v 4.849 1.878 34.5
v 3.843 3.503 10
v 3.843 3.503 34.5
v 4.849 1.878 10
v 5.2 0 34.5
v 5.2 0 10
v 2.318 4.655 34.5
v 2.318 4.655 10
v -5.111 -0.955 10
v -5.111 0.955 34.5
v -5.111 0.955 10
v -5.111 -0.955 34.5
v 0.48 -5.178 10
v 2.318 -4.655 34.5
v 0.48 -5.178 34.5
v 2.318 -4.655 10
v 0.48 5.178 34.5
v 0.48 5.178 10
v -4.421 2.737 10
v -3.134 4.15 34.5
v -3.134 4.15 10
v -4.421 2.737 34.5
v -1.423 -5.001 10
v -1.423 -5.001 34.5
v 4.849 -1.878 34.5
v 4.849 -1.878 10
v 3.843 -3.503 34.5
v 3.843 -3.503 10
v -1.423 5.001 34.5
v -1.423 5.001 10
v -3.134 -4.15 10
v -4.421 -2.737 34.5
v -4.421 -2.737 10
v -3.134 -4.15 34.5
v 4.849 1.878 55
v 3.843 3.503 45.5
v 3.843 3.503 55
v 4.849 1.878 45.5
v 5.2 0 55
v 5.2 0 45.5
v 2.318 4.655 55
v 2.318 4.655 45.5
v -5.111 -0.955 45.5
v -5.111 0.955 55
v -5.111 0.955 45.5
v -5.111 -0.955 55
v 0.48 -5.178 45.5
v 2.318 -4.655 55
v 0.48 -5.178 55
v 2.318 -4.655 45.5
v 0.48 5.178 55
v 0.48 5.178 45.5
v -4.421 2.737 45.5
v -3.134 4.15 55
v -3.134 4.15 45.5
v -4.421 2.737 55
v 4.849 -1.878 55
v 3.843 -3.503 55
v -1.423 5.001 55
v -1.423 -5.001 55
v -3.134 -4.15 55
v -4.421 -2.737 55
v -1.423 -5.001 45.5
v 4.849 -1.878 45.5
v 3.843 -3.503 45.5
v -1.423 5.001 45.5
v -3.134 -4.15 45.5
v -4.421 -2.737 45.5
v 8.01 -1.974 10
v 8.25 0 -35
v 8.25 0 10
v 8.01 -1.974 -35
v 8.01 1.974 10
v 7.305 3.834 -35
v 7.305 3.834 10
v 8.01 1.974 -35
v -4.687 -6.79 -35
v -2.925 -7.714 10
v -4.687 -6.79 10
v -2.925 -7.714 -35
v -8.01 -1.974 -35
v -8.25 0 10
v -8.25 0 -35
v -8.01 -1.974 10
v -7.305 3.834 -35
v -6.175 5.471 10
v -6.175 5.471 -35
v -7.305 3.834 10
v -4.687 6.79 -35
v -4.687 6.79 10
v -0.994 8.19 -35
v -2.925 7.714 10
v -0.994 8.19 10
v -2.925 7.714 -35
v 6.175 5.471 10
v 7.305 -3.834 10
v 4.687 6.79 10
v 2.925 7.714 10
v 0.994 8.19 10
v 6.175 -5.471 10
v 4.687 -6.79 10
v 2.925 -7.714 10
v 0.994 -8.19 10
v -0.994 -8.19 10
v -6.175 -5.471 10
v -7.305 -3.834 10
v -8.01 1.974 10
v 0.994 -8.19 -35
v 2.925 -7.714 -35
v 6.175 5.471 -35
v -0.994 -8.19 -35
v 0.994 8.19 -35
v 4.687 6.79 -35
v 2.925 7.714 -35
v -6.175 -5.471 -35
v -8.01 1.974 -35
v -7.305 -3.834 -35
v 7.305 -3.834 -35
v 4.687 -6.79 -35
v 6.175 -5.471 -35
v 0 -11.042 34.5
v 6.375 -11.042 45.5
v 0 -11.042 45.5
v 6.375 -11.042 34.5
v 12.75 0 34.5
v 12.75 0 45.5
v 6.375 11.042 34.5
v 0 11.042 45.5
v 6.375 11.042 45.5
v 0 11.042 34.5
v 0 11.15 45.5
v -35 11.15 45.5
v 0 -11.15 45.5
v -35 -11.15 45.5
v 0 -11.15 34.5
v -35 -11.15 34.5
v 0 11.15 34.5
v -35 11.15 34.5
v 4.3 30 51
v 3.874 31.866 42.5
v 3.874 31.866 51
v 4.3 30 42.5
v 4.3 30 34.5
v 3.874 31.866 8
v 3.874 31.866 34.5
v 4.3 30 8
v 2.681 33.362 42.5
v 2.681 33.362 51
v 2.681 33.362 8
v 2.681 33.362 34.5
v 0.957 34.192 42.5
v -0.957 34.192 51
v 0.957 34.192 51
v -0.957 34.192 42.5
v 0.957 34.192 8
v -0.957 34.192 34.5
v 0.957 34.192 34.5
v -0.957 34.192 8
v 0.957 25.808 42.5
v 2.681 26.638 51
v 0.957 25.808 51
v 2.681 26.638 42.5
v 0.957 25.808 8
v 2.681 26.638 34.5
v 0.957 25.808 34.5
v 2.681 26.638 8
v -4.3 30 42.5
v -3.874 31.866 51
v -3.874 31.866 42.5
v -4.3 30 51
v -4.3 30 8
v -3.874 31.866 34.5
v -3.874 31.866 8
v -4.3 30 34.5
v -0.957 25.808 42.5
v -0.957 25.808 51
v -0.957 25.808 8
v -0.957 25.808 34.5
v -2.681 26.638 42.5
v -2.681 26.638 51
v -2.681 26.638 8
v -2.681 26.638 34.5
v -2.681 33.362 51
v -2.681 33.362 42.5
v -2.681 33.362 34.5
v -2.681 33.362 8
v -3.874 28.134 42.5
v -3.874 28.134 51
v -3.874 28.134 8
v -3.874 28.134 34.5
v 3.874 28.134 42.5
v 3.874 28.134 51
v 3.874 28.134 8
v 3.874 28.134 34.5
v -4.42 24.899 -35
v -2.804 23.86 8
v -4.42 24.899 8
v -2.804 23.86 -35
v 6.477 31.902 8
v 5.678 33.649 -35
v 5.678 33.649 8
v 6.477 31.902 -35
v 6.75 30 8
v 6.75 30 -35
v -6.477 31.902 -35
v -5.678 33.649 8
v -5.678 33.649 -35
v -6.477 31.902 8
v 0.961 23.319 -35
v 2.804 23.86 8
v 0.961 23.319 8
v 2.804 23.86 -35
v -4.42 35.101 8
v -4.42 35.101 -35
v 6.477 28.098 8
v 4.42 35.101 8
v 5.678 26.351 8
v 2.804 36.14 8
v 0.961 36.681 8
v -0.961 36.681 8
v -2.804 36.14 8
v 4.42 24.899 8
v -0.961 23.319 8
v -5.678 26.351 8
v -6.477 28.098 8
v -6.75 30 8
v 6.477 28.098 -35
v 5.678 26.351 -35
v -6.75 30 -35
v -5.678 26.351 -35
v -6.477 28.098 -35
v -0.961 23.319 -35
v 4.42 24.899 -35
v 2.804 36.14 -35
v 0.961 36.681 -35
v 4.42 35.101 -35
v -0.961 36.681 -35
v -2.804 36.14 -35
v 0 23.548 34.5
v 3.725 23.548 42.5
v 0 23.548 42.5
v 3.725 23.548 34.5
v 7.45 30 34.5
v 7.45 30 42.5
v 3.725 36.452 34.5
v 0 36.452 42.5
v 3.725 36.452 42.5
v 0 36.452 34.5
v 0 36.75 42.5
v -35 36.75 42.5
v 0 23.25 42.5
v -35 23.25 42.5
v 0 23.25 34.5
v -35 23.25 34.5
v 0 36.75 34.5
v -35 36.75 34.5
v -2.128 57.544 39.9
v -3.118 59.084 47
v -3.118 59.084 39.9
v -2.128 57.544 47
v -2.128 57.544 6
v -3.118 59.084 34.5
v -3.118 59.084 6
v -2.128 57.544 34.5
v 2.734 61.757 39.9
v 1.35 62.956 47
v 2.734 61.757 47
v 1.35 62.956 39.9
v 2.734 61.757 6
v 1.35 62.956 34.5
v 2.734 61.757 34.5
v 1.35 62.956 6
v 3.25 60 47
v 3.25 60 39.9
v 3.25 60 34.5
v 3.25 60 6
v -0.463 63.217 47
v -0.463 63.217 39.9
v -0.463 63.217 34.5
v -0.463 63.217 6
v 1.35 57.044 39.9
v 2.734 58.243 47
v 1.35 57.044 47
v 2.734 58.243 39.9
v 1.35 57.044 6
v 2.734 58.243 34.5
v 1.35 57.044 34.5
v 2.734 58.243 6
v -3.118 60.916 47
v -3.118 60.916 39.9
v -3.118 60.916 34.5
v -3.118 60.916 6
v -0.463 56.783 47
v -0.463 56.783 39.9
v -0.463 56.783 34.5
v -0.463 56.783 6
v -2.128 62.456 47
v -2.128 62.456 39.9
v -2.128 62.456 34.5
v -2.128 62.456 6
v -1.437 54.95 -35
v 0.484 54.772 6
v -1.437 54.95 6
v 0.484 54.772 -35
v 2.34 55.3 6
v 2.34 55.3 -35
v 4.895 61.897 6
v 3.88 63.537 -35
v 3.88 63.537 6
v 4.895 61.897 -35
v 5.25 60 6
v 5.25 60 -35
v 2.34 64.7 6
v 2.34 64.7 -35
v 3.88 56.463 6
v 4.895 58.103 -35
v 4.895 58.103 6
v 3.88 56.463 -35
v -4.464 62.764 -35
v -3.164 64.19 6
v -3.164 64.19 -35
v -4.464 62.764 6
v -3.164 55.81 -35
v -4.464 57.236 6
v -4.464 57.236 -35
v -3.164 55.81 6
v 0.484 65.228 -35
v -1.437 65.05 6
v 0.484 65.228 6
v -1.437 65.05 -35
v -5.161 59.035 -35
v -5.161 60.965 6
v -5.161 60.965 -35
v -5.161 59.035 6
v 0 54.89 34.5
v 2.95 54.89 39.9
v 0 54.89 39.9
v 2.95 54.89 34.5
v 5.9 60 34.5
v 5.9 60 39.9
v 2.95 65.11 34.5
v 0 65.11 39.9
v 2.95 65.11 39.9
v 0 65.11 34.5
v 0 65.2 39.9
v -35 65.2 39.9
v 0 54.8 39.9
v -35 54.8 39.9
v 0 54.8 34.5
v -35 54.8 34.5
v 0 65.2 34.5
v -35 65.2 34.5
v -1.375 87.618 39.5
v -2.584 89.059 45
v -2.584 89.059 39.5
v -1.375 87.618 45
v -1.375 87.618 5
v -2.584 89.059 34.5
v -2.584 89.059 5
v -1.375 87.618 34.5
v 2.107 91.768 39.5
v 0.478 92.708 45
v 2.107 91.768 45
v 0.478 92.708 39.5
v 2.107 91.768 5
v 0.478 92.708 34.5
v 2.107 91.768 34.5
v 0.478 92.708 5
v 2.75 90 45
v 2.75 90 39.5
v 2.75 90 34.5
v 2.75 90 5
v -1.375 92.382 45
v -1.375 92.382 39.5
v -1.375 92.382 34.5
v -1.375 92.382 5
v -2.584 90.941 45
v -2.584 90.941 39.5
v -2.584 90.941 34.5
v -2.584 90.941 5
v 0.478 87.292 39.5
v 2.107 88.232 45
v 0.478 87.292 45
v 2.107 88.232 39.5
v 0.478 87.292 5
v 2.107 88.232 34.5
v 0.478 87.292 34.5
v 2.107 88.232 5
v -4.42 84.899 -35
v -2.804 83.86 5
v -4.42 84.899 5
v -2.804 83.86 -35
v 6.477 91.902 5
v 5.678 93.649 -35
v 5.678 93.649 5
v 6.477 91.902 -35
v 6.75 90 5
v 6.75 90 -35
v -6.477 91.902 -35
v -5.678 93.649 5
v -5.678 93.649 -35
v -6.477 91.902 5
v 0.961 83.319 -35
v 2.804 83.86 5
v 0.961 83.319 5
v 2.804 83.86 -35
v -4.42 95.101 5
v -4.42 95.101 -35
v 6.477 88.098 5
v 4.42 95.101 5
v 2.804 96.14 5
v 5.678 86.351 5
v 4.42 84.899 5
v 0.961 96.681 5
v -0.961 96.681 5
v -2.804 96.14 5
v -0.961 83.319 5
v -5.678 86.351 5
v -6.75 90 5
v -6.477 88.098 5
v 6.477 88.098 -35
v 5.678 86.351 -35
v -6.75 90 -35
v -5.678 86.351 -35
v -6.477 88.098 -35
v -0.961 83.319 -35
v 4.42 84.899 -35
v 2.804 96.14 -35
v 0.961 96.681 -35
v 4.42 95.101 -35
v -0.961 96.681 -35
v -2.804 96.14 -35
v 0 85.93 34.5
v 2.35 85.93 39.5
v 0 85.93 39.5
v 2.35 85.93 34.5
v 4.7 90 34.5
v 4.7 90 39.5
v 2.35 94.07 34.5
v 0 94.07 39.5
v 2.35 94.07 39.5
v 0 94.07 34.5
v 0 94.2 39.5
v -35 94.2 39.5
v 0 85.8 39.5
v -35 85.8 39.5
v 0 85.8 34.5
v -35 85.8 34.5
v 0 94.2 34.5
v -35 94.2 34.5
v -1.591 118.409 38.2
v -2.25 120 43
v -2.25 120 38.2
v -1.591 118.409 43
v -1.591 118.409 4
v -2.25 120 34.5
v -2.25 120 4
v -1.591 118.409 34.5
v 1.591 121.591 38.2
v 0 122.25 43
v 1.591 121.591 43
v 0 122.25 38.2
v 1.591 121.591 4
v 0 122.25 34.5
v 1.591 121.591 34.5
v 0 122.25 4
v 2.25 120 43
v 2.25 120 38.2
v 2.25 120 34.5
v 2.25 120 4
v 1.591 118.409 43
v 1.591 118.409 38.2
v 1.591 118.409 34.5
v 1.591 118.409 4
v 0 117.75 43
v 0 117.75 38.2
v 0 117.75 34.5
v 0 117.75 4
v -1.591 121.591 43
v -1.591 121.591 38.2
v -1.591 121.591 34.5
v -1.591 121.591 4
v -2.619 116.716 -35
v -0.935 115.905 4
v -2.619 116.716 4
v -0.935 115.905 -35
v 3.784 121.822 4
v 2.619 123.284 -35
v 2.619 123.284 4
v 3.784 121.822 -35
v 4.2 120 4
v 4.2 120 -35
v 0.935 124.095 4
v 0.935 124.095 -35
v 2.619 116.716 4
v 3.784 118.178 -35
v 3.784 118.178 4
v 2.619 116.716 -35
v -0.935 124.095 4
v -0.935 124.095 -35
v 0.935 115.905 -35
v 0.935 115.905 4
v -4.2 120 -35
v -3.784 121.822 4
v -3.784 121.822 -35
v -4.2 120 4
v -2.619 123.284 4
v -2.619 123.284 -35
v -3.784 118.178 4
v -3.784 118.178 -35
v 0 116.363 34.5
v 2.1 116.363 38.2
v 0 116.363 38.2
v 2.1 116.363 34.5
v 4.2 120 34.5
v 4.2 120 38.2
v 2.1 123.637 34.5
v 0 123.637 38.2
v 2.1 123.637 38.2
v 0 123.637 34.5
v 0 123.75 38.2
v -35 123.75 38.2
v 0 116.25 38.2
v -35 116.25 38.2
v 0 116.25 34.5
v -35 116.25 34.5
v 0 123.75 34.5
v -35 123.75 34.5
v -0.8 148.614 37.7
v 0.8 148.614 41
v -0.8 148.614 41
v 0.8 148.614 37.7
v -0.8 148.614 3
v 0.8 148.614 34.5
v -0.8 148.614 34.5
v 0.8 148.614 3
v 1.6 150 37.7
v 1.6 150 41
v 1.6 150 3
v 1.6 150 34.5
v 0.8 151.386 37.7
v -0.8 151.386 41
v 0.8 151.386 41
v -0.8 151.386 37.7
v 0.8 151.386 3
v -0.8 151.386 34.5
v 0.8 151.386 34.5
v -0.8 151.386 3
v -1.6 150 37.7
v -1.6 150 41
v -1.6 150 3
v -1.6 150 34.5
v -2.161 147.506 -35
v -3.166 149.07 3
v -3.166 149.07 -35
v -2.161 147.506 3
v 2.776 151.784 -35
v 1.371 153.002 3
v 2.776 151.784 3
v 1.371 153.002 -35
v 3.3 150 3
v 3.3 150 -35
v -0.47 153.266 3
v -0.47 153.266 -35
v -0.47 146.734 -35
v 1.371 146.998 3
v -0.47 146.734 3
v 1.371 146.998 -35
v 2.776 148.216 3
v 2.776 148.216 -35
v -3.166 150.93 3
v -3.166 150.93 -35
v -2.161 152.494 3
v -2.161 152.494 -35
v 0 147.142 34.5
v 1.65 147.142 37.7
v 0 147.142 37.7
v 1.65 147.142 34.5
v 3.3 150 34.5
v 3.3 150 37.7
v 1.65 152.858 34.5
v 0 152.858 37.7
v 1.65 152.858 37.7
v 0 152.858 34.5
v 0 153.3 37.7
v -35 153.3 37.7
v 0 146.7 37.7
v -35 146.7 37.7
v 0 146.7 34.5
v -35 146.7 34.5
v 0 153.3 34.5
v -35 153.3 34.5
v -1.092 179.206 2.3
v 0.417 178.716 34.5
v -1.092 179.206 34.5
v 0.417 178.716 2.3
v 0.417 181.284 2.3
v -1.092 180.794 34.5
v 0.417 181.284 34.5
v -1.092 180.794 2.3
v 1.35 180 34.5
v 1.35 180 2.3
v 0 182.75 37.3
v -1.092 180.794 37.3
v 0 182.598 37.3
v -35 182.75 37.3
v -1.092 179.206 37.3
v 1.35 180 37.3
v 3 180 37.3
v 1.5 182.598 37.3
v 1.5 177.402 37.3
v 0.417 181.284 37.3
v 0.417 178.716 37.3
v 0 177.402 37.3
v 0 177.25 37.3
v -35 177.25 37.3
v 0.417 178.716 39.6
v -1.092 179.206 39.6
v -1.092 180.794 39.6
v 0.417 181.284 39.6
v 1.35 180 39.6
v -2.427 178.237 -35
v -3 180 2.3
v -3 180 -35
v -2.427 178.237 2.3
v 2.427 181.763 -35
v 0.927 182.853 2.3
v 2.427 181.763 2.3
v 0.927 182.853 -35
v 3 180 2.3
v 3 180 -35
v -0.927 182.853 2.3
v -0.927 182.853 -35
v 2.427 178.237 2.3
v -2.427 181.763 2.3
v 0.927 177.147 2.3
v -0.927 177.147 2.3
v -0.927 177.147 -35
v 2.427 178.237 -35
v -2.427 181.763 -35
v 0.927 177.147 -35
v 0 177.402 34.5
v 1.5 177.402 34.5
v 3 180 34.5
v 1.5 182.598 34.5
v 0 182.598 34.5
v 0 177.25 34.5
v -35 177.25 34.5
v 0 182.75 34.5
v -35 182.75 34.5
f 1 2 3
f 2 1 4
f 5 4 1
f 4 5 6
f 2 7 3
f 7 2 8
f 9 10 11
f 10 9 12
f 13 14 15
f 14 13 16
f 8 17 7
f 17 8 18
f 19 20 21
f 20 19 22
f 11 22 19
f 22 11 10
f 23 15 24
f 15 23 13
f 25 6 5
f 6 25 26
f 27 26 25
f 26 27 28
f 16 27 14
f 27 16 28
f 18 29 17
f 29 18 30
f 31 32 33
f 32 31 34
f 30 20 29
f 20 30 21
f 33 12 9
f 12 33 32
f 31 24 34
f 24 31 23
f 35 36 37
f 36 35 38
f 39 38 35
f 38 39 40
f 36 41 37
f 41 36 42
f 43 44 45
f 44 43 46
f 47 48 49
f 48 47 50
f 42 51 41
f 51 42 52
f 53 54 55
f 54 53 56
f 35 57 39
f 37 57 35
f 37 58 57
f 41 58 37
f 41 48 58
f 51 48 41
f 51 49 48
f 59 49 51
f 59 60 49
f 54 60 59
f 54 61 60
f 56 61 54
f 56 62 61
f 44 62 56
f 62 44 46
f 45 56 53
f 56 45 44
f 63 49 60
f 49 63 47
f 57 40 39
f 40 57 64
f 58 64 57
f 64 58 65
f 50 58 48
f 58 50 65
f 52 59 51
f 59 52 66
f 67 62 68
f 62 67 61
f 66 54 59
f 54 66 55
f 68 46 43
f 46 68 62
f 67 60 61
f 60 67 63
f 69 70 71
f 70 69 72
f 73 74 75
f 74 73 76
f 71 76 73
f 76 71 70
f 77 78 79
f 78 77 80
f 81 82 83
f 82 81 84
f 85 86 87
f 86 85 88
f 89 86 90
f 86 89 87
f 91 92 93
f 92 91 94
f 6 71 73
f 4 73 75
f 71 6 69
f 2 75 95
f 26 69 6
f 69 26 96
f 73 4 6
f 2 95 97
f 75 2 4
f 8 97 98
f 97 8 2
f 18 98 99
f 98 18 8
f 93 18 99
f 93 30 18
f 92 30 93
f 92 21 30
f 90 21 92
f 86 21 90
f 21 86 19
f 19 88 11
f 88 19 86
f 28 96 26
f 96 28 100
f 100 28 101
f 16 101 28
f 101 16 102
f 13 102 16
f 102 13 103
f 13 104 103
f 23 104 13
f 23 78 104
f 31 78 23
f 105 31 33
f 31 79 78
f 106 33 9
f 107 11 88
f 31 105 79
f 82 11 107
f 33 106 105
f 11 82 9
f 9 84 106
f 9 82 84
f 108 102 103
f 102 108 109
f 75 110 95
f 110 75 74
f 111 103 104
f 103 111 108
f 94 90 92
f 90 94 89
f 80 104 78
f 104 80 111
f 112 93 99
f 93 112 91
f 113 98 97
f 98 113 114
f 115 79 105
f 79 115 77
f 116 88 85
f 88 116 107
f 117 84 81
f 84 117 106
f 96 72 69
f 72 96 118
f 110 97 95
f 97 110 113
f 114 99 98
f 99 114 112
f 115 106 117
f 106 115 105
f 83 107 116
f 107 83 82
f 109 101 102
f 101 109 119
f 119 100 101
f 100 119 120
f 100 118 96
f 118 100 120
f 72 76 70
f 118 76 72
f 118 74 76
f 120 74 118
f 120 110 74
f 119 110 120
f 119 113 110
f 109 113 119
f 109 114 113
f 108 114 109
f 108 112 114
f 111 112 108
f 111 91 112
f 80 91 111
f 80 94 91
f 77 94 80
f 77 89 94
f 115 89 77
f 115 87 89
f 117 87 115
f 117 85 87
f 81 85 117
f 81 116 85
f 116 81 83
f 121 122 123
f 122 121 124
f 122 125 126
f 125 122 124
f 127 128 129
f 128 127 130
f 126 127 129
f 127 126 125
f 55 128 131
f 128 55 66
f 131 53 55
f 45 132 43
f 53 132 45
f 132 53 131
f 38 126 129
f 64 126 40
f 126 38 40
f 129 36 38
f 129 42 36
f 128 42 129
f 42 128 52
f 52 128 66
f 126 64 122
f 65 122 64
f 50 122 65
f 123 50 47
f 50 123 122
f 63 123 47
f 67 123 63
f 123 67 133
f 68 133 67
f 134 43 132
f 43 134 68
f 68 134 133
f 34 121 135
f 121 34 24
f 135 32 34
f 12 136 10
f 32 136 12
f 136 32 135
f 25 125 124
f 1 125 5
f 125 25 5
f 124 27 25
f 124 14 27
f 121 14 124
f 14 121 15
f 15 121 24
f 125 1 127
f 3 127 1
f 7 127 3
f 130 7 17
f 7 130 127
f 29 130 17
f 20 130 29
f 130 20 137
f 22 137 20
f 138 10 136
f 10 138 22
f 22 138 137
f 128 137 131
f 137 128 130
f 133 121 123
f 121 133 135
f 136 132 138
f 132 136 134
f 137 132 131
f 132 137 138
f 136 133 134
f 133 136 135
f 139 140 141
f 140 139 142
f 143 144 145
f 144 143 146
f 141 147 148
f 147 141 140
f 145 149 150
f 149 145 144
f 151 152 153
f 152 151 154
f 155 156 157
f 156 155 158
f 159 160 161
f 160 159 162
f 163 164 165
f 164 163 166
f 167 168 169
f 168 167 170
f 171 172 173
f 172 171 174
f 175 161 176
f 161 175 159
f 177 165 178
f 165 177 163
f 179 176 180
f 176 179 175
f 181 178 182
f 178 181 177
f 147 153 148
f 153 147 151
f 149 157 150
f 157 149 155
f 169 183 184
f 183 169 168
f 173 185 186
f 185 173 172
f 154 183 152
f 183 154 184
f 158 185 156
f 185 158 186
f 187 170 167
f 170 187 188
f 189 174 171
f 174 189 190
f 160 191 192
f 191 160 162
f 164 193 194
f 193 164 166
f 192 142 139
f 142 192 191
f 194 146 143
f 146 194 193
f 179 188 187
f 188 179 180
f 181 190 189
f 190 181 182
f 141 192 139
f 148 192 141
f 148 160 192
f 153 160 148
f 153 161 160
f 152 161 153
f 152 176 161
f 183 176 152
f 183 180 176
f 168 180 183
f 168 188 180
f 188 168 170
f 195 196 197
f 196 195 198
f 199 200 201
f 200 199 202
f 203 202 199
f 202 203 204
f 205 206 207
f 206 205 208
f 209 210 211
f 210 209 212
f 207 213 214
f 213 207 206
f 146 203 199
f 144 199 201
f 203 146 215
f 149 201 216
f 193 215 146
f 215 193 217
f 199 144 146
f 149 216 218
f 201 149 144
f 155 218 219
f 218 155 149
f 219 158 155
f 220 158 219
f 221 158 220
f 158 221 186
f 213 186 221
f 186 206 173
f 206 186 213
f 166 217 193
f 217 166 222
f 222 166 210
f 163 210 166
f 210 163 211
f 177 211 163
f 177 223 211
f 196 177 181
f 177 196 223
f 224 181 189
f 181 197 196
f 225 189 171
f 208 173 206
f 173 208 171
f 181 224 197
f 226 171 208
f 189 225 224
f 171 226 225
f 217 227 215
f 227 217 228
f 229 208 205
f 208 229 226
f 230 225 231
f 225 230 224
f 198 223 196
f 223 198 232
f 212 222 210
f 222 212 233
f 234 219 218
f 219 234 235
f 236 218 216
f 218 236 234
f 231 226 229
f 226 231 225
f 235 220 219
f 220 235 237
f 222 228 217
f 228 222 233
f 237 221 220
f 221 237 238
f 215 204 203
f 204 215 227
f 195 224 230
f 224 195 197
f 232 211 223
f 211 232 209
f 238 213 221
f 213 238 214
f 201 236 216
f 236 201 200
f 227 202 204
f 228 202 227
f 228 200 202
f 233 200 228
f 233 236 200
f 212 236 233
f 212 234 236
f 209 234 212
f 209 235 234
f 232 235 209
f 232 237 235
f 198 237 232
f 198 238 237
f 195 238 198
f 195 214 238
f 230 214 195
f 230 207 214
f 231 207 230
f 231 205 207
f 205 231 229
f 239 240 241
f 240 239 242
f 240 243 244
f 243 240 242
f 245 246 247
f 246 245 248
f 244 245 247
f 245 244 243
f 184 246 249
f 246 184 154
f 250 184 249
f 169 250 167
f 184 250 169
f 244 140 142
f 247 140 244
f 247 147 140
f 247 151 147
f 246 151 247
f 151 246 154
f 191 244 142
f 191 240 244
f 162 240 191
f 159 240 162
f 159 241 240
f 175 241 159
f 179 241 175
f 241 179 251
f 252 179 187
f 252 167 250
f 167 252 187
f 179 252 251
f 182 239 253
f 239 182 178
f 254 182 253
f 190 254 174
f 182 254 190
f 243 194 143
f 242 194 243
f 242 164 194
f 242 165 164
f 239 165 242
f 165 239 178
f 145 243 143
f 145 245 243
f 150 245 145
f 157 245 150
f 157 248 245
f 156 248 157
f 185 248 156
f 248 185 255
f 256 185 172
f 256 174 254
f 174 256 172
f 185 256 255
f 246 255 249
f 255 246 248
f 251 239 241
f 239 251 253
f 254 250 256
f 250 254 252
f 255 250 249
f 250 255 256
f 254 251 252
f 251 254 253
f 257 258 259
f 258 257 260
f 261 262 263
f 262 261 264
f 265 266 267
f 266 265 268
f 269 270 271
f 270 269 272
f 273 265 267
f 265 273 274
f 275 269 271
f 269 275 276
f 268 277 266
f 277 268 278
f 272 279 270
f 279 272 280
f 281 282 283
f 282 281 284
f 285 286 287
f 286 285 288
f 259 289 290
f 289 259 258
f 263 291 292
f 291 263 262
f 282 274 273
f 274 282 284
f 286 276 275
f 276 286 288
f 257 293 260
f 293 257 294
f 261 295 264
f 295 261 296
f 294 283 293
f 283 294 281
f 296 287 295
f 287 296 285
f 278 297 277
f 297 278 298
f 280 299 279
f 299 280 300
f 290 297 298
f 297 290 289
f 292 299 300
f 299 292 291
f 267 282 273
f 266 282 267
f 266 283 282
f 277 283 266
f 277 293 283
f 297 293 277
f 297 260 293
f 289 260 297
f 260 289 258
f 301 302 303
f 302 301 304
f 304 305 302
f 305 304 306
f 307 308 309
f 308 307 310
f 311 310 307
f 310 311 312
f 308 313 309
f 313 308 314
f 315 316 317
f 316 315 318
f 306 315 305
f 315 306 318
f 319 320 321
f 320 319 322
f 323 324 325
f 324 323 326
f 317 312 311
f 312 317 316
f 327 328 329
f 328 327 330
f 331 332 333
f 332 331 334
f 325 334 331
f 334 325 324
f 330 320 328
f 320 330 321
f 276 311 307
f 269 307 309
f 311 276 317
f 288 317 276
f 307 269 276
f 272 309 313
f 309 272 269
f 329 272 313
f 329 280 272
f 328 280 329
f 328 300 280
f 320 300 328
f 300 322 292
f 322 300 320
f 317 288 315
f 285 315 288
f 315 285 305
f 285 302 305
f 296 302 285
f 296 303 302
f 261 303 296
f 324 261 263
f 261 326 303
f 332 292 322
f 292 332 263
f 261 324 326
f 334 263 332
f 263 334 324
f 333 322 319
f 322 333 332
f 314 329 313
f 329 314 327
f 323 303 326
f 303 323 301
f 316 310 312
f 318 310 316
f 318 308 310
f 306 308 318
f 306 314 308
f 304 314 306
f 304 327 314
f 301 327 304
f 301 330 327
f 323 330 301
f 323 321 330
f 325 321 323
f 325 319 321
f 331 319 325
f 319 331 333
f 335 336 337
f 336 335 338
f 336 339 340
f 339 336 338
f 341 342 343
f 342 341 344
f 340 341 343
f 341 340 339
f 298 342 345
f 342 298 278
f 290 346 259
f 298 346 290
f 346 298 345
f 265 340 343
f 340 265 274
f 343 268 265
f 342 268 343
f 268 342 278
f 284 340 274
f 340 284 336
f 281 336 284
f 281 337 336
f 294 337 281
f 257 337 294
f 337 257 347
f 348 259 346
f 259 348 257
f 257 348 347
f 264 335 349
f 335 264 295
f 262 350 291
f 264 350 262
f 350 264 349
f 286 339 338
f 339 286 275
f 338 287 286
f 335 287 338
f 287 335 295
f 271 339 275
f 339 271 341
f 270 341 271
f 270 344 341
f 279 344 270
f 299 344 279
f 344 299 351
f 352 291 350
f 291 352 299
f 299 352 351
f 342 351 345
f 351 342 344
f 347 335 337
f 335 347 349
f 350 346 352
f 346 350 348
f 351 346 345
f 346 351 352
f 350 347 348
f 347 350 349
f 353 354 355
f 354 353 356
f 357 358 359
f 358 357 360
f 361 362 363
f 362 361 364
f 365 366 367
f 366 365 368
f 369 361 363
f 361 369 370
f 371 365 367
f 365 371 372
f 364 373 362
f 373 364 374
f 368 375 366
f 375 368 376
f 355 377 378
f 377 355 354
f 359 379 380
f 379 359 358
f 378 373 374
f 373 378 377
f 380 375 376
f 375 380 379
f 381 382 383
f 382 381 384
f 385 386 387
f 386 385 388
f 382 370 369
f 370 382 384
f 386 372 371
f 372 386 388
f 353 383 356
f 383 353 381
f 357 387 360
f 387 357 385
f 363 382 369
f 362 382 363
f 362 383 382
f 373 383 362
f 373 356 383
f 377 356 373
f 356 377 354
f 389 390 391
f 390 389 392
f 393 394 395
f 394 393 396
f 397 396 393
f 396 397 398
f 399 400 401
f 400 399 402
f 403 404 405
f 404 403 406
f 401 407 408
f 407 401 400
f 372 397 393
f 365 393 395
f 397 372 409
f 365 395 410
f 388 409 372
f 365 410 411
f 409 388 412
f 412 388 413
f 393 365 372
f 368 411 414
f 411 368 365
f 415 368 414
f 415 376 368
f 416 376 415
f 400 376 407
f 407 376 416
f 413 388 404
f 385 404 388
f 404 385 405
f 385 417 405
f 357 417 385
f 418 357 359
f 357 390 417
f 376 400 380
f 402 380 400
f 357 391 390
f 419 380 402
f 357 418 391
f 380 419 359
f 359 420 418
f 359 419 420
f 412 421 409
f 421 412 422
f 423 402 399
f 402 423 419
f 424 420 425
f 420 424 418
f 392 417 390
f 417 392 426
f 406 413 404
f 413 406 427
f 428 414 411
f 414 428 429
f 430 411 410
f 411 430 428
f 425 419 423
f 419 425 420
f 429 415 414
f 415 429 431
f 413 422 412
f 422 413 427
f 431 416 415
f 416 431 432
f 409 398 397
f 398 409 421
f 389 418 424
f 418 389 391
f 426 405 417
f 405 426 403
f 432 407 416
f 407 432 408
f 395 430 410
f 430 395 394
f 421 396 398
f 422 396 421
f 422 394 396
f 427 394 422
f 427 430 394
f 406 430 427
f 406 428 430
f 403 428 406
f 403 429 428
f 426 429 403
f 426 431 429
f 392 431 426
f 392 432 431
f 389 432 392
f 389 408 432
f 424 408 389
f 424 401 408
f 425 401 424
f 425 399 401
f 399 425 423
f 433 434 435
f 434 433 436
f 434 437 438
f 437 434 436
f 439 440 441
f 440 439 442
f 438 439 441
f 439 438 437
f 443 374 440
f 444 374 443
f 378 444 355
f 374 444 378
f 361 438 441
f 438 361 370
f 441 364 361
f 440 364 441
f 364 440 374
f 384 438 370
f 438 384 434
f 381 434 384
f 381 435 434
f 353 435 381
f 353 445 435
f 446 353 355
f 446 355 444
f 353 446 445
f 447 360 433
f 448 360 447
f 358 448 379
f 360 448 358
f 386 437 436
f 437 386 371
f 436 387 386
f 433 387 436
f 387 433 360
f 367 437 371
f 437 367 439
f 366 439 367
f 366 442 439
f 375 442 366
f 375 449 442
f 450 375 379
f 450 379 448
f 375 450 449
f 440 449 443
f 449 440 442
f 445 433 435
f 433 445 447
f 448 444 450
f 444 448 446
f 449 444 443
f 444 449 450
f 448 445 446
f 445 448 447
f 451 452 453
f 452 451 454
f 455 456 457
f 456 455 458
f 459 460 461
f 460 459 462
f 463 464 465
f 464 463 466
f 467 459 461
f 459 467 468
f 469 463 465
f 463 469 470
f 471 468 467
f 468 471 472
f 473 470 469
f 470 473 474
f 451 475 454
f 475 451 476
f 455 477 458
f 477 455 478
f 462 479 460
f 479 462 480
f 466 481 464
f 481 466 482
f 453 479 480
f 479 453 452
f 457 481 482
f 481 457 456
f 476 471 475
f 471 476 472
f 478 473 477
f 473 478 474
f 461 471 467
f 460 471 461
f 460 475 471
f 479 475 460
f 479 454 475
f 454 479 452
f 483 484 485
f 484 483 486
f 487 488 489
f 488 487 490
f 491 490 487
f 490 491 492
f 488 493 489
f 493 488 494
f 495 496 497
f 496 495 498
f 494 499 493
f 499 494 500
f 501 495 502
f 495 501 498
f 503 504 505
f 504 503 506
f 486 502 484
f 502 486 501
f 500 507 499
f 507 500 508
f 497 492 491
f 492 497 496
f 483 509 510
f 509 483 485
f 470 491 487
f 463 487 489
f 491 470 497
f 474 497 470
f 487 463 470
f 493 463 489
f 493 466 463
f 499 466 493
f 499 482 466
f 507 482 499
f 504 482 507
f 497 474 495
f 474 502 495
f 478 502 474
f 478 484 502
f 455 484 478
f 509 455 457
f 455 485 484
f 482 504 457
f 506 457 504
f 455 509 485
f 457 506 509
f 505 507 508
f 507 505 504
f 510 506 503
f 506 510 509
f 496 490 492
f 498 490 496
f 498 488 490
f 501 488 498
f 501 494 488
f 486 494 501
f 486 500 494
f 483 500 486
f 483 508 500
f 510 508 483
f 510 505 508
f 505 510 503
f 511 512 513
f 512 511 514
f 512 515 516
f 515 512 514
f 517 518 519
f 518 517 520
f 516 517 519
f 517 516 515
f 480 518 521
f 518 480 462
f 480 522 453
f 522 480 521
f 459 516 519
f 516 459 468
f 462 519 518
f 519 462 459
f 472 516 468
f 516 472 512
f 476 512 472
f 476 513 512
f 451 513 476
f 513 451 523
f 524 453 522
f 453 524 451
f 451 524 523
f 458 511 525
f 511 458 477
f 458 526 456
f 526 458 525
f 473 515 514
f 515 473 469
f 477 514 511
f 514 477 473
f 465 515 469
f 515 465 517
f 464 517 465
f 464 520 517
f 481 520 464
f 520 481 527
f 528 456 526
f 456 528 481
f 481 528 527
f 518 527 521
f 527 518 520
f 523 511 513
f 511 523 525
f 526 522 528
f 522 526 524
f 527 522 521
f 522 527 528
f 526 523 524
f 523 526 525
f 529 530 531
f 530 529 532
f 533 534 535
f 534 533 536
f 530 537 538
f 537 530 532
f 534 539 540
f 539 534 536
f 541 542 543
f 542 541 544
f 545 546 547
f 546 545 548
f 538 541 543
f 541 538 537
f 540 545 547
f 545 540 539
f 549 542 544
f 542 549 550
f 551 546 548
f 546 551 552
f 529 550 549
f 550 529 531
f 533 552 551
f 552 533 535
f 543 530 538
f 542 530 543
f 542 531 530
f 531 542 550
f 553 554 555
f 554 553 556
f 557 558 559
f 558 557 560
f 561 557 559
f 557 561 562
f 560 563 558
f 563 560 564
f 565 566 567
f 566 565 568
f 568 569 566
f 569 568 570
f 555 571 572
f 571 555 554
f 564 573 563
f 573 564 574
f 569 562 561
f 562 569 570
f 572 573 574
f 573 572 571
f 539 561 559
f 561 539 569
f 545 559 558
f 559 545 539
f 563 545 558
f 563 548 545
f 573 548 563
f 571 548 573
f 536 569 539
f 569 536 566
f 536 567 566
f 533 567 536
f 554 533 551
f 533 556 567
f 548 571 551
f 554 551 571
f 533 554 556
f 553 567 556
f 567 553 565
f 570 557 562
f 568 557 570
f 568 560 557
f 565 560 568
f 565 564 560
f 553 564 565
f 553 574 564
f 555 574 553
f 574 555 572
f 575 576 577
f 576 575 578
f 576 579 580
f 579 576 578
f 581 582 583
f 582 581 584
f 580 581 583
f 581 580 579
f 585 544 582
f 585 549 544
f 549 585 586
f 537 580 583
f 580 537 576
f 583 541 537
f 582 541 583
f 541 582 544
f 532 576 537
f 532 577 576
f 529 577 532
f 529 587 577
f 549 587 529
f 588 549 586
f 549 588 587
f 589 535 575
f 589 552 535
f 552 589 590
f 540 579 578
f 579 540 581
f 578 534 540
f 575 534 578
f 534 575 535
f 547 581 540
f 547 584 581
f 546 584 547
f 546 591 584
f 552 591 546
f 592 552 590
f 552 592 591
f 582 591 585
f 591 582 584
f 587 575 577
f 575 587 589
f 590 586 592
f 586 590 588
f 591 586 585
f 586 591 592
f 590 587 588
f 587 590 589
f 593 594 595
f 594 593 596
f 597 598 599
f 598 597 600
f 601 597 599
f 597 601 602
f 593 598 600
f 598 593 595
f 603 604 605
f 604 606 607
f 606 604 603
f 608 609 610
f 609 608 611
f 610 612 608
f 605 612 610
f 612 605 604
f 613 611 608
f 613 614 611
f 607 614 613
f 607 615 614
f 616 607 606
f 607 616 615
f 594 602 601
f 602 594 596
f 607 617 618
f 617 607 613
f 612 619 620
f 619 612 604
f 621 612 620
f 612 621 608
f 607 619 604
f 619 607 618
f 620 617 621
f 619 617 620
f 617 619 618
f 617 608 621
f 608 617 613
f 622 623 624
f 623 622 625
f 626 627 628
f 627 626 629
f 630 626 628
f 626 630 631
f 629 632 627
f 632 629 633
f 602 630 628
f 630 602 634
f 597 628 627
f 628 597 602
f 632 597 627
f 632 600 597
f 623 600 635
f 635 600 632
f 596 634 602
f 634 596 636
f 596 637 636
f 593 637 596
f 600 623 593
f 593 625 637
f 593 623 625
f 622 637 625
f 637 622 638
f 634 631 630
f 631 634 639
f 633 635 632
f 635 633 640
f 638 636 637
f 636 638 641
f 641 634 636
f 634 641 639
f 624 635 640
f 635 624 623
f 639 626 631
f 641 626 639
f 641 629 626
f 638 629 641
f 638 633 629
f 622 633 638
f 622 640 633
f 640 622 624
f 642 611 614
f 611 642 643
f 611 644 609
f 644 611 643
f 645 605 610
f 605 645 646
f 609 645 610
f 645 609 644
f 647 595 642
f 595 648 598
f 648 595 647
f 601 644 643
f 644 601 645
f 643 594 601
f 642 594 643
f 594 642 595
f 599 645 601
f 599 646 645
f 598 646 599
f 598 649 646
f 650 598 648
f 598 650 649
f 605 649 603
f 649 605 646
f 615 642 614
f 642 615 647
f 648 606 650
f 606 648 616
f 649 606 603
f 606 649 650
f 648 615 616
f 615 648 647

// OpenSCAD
// file: ../../parameters.scad
maximum_printable_size = 150;

layer_thickness = 0.3;
global_clearance = 0.5;

platform_base_diameter = 400; // Průměr ukotvení válců spodní platformy
platform_base_thickness = 20;
platform_cylinder_medium_length = 250;  // délka pneumatického válce s pístem vysunutým do poloviny rozsahu
platform_base_cylinder_spacing = 38;    //rozestupy spodního a horního ukotvení válců.
platform_top_cylinder_spacing = 30;
platform_top_diameter = 150;   // Průměr horní základny (vdálenost od středu základny do středu kulového kloubu ke kterému je uchycen pneumatický válec)


// screw length step - minimum difference in length between two types of screws
basic_screw_length = 5;


//Screw diameter and nut for M10 [mm]
M10_screw_diameter = 10.4;
M10_head_height = 10;
M10_head_diameter = 16+0.5;
M10_nut_height = 10.5;
M10_nut_diameter = 25.5;
M10_nut_pocket = 22.3;

//Screw diameter for M8 [mm]
M8_screw_diameter = 8.6;
M8_head_height = 8;
M8_head_diameter = 13.5;
M8_nut_height = 7.5;
M8_nut_diameter = 14.4 + 0.5;
M8_nut_pocket = 13 + 0.5;
M8_washer_diameter = 16;
M8_washer_thickness = 1.5;


//Screw diameter and nut for M6 [mm]
M6_screw_diameter=6.5;
M6_head_diameter = 10+0.5;
M6_head_height = 6;
M6_nut_height = 4.9;
M6_nut_diameter = 11.8;
M6_nut_pocket = 10.4;
M6_square_nut_height = 3;
M6_square_nut_diameter = 10;

//Screw diameter and nut for M5 [mm]
M5_screw_diameter=5.5;
M5_head_height = 5;
M5_head_diameter = 13+0.5;
M5_nut_height = 4.5;
M5_nut_diameter = 9.4;
M5_nut_pocket = 8.4;

//Screw diameter and nut for M4 [mm]
M4_screw_diameter=4.5;
M4_screw_head_height = 4;
M4_nut_height = 3.2;
M4_nut_diameter = 8.4;
M4_nut_pocket = 7.5;

//Screw diameter and nut for M3 [mm]
M3_screw_diameter = 3.2;
M3_nut_height = 2.7;
M3_nut_diameter = 6.6;
M3_screw_head_height = 3;

//Screw diameter and nut for M2,5 [mm]
M2_5_screw_diameter = 2.7;
M2_5_nut_height = 2.3;
M2_5_nut_diameter = 6;
M2_5_nut_pocket = 5.5;

// kulove lozisko

bearing_efsm_08_h = 33+1;
bearing_efsm_08_m = 22;
bearing_efsm_08_db = 18;
bearing_efsm_08_ag = 10.5;
bearing_efsm_08_n = M4_screw_diameter;
bearing_efsm_08_a1 = 5.5;
bearing_efsm_08_d = 8.25;
bearing_efsm_08_B = 8; // ball height

bearing_efsm_10_h = 38+1;
bearing_efsm_10_m = 26;
bearing_efsm_10_db = 21.9;
bearing_efsm_10_ag = 12+0.2;
bearing_efsm_10_n = M5_screw_diameter;
bearing_efsm_10_a1 = 6.5;
bearing_efsm_10_d = 10.25;


bearing_efsm_12_width = 40+1;
bearing_efsm_12_h = bearing_efsm_12_width;
bearing_efsm_12_boltd = 28/2; // polovina vzdalenosti mezi srouby
bearing_efsm_12_m = bearing_efsm_12_boltd*2;
bearing_efsm_12_db = 25;
bearing_efsm_12_ag = 13;
bearing_efsm_12_a1 = 7;
bearing_efsm_12_n = M5_screw_diameter;
bearing_efsm_12_d = 12.15;
bearing_efsm_12_B = 10; // ball height
bearing_efsm_space = 1;

bearing_efsm_17_width = 54+1;
bearing_efsm_17_h = bearing_efsm_17_width;
bearing_efsm_17_boltd = 38/2; // polovina vzdalenosti mezi srouby
bearing_efsm_17_m = bearing_efsm_17_boltd*2;
bearing_efsm_17_db = 35;
bearing_efsm_17_ag = 18;
bearing_efsm_17_n = M6_screw_diameter;
bearing_efsm_17_a1 = 10;
bearing_efsm_17_B = 17; // ball height

//limcove lozisko
bearing_EFOM_10_L=26; //celkova sirka zakladny
bearing_EFOM_10_d1=10.3;//diametr otvoru real=10 mm
bearing_EFOM_10_dB=22;//diametr vystupku pro ulozeni lozika
bearing_EFOM_10_H=52;//celková delka zakladny
bearing_EFOM_10_J=36;// hole pitch
bearing_EFOM_10_A1=6.5;//vyska pouzdra
bearing_EFOM_10_Ag=12;//celkova vyska
bearing_EFOM_10_N1=5;//sirka otvoru pro sroub
bearing_EFOM_10_N2=8;//delka otvoru pro sroub
bearing_EFOM_10_m=36;//roztec der pro sroub
bearing_EFOM_10_h=9;//vyska lozika


608_bearing_outer_diameter = 22.3;
608_bearing_inner_diameter = 16;
608_bearing_thickness = 7.1;


// 20 KG servo parameters

servo_20kg_axis_offset = 9.375; // jak je osa mimo stredu
servo_20kg_body_x = 42;
servo_20kg_body_y = 21;
servo_20kg_body_z = 40;
servo_20kg_thread_x = 49/2;
servo_20kg_thread_y = 10/2;
servo_20kg_body_below = 10; // jak hluboko je tělo serva pod drzaky na srouby
servo_20kg_below = 25.8; // jak hluboko je páka serva pod drzaky na srouby

servo_20kg_bolt_d = 2.5+0.3;
servo_20kg_nut_d = 5+0.3;


//strain gauge
strain_gauge_width = 12.7;
strain_gauge_length = 75.1;
strain_gauge_screw_distance = 10;

//ALU profile
ALU_profile_width = 30.3;
ALU_profile_holder_wall_thickness = 3;
ALU_profile_groove_width = 8;

//pillow block bearing
//https://www.igus.eu/product/372
//Part no. KSTM-08
KSTM08_screws_distance = 33;         //m
KSTM08_screws_holes_diameter = 4.5;  //d2
KSTM08_flange_thickness = 6;         //h3
KSTM08_case_width = 9;               //C1
KSTM08_case_length = 47;             //a
KSTM08_ball_width = 12;              //B


//ložiska pro malý rotor
bearing_outer_diameter = 10.2;    // Rozměr B1 v nákresu s přídavkem na toleranci otvoru
bearing_thickness = 4;        // Rozměr B2 v nákresu
//bearing_shaft_length = 19.5;    // Rozměr B3 v nákresu, Originalni hodnota 19.5
bearing_shaft_length = 20;    // Rozměr B3 v nákresu


//parametry víčka s telemetrickou anténou
S01_sila_materialu=1.2;
S01_vyska_horni_zavit=10;
S01_hloubka_zavitu=4;
S01_prumer_vnitrni=50;
LO_spodni_prumer=17.2;
LO_vyska_bez_krytu=15;
S01_tolerance_zavit=1.5;
R01_vyska_prekryti_statoru=10;
// main file
include <../../parameters.scad>

module bolt(size = 4, length = 35, pocket = true, pocket_size = 35, washer = false,
            square_nut = false)
{
    bolts = [//size | bolt d | head h | head d | nut h | nut d | nut pckt 
             [10    ,  10.4  , 10     , 16.5   , 10.5  , 25.5  , 22.3],
             [8     ,  8.6   , 8      , 13.5   , 7.5   , 14.9  , 13.5],
             [6     ,  6.5   , 6      , 10.5   , 4.9   , 11.8  , 10.4],
             [5     ,  5.5   , 5      , 13.5   , 4.5   , 9.4   , 8.4 ],
             [4     ,  4.5   , 4      , 8.4    , 3.2   , 8.4   , 7.5 ],
             [3     ,  3.2   , 3      , 6.6    , 2.7   , 6.6   , 6.6 ],
             [2.5   ,  2.7   , 2.3    , 6      , 2.3   , 6     , 5.5 ],
            ];
    bolt_diameter = bolts[search(size, bolts)[0]][1];
    head_height   = bolts[search(size, bolts)[0]][2];
    head_diameter = bolts[search(size, bolts)[0]][3];
    nut_height    = bolts[search(size, bolts)[0]][4];
    nut_diameter  = bolts[search(size, bolts)[0]][5];
    nut_pocket    = bolts[search(size, bolts)[0]][6];

    // bolt
    color("gray", 1)
        cylinder(h = length + head_height, d = bolt_diameter);
    // bolt pocket
    translate([0, 0, length + head_height])
        cylinder(h = head_height, d = bolt_diameter);
    // head
    color("gray")
        cylinder(h = head_height, d = head_diameter);
    // head pocket
    translate([0, 0, -length])
        cylinder(h = length, d = head_diameter);
    // nut TODO square nut option
    if (square_nut == false)
        color("gray")
            translate([0, 0, length - global_clearance])
                cylinder(h = nut_height + global_clearance, d = nut_diameter, $fn=6);
    // nut pocket TODO square nut option
    if (pocket == true)
        translate([-pocket_size, -nut_pocket/2, length - global_clearance])
            cube([pocket_size, nut_pocket, nut_height + global_clearance]);
    // TODO washer
}

// Example
bolt(10);
translate([0, 30, 0])
    bolt(8);
translate([0, 60, 0])
    bolt(6);
translate([0, 90, 0])
    bolt(5);
translate([0, 120, 0])
    bolt(4);
translate([0, 150, 0])
    bolt(3);
translate([0, 180, 0])
    bolt(2.5);
